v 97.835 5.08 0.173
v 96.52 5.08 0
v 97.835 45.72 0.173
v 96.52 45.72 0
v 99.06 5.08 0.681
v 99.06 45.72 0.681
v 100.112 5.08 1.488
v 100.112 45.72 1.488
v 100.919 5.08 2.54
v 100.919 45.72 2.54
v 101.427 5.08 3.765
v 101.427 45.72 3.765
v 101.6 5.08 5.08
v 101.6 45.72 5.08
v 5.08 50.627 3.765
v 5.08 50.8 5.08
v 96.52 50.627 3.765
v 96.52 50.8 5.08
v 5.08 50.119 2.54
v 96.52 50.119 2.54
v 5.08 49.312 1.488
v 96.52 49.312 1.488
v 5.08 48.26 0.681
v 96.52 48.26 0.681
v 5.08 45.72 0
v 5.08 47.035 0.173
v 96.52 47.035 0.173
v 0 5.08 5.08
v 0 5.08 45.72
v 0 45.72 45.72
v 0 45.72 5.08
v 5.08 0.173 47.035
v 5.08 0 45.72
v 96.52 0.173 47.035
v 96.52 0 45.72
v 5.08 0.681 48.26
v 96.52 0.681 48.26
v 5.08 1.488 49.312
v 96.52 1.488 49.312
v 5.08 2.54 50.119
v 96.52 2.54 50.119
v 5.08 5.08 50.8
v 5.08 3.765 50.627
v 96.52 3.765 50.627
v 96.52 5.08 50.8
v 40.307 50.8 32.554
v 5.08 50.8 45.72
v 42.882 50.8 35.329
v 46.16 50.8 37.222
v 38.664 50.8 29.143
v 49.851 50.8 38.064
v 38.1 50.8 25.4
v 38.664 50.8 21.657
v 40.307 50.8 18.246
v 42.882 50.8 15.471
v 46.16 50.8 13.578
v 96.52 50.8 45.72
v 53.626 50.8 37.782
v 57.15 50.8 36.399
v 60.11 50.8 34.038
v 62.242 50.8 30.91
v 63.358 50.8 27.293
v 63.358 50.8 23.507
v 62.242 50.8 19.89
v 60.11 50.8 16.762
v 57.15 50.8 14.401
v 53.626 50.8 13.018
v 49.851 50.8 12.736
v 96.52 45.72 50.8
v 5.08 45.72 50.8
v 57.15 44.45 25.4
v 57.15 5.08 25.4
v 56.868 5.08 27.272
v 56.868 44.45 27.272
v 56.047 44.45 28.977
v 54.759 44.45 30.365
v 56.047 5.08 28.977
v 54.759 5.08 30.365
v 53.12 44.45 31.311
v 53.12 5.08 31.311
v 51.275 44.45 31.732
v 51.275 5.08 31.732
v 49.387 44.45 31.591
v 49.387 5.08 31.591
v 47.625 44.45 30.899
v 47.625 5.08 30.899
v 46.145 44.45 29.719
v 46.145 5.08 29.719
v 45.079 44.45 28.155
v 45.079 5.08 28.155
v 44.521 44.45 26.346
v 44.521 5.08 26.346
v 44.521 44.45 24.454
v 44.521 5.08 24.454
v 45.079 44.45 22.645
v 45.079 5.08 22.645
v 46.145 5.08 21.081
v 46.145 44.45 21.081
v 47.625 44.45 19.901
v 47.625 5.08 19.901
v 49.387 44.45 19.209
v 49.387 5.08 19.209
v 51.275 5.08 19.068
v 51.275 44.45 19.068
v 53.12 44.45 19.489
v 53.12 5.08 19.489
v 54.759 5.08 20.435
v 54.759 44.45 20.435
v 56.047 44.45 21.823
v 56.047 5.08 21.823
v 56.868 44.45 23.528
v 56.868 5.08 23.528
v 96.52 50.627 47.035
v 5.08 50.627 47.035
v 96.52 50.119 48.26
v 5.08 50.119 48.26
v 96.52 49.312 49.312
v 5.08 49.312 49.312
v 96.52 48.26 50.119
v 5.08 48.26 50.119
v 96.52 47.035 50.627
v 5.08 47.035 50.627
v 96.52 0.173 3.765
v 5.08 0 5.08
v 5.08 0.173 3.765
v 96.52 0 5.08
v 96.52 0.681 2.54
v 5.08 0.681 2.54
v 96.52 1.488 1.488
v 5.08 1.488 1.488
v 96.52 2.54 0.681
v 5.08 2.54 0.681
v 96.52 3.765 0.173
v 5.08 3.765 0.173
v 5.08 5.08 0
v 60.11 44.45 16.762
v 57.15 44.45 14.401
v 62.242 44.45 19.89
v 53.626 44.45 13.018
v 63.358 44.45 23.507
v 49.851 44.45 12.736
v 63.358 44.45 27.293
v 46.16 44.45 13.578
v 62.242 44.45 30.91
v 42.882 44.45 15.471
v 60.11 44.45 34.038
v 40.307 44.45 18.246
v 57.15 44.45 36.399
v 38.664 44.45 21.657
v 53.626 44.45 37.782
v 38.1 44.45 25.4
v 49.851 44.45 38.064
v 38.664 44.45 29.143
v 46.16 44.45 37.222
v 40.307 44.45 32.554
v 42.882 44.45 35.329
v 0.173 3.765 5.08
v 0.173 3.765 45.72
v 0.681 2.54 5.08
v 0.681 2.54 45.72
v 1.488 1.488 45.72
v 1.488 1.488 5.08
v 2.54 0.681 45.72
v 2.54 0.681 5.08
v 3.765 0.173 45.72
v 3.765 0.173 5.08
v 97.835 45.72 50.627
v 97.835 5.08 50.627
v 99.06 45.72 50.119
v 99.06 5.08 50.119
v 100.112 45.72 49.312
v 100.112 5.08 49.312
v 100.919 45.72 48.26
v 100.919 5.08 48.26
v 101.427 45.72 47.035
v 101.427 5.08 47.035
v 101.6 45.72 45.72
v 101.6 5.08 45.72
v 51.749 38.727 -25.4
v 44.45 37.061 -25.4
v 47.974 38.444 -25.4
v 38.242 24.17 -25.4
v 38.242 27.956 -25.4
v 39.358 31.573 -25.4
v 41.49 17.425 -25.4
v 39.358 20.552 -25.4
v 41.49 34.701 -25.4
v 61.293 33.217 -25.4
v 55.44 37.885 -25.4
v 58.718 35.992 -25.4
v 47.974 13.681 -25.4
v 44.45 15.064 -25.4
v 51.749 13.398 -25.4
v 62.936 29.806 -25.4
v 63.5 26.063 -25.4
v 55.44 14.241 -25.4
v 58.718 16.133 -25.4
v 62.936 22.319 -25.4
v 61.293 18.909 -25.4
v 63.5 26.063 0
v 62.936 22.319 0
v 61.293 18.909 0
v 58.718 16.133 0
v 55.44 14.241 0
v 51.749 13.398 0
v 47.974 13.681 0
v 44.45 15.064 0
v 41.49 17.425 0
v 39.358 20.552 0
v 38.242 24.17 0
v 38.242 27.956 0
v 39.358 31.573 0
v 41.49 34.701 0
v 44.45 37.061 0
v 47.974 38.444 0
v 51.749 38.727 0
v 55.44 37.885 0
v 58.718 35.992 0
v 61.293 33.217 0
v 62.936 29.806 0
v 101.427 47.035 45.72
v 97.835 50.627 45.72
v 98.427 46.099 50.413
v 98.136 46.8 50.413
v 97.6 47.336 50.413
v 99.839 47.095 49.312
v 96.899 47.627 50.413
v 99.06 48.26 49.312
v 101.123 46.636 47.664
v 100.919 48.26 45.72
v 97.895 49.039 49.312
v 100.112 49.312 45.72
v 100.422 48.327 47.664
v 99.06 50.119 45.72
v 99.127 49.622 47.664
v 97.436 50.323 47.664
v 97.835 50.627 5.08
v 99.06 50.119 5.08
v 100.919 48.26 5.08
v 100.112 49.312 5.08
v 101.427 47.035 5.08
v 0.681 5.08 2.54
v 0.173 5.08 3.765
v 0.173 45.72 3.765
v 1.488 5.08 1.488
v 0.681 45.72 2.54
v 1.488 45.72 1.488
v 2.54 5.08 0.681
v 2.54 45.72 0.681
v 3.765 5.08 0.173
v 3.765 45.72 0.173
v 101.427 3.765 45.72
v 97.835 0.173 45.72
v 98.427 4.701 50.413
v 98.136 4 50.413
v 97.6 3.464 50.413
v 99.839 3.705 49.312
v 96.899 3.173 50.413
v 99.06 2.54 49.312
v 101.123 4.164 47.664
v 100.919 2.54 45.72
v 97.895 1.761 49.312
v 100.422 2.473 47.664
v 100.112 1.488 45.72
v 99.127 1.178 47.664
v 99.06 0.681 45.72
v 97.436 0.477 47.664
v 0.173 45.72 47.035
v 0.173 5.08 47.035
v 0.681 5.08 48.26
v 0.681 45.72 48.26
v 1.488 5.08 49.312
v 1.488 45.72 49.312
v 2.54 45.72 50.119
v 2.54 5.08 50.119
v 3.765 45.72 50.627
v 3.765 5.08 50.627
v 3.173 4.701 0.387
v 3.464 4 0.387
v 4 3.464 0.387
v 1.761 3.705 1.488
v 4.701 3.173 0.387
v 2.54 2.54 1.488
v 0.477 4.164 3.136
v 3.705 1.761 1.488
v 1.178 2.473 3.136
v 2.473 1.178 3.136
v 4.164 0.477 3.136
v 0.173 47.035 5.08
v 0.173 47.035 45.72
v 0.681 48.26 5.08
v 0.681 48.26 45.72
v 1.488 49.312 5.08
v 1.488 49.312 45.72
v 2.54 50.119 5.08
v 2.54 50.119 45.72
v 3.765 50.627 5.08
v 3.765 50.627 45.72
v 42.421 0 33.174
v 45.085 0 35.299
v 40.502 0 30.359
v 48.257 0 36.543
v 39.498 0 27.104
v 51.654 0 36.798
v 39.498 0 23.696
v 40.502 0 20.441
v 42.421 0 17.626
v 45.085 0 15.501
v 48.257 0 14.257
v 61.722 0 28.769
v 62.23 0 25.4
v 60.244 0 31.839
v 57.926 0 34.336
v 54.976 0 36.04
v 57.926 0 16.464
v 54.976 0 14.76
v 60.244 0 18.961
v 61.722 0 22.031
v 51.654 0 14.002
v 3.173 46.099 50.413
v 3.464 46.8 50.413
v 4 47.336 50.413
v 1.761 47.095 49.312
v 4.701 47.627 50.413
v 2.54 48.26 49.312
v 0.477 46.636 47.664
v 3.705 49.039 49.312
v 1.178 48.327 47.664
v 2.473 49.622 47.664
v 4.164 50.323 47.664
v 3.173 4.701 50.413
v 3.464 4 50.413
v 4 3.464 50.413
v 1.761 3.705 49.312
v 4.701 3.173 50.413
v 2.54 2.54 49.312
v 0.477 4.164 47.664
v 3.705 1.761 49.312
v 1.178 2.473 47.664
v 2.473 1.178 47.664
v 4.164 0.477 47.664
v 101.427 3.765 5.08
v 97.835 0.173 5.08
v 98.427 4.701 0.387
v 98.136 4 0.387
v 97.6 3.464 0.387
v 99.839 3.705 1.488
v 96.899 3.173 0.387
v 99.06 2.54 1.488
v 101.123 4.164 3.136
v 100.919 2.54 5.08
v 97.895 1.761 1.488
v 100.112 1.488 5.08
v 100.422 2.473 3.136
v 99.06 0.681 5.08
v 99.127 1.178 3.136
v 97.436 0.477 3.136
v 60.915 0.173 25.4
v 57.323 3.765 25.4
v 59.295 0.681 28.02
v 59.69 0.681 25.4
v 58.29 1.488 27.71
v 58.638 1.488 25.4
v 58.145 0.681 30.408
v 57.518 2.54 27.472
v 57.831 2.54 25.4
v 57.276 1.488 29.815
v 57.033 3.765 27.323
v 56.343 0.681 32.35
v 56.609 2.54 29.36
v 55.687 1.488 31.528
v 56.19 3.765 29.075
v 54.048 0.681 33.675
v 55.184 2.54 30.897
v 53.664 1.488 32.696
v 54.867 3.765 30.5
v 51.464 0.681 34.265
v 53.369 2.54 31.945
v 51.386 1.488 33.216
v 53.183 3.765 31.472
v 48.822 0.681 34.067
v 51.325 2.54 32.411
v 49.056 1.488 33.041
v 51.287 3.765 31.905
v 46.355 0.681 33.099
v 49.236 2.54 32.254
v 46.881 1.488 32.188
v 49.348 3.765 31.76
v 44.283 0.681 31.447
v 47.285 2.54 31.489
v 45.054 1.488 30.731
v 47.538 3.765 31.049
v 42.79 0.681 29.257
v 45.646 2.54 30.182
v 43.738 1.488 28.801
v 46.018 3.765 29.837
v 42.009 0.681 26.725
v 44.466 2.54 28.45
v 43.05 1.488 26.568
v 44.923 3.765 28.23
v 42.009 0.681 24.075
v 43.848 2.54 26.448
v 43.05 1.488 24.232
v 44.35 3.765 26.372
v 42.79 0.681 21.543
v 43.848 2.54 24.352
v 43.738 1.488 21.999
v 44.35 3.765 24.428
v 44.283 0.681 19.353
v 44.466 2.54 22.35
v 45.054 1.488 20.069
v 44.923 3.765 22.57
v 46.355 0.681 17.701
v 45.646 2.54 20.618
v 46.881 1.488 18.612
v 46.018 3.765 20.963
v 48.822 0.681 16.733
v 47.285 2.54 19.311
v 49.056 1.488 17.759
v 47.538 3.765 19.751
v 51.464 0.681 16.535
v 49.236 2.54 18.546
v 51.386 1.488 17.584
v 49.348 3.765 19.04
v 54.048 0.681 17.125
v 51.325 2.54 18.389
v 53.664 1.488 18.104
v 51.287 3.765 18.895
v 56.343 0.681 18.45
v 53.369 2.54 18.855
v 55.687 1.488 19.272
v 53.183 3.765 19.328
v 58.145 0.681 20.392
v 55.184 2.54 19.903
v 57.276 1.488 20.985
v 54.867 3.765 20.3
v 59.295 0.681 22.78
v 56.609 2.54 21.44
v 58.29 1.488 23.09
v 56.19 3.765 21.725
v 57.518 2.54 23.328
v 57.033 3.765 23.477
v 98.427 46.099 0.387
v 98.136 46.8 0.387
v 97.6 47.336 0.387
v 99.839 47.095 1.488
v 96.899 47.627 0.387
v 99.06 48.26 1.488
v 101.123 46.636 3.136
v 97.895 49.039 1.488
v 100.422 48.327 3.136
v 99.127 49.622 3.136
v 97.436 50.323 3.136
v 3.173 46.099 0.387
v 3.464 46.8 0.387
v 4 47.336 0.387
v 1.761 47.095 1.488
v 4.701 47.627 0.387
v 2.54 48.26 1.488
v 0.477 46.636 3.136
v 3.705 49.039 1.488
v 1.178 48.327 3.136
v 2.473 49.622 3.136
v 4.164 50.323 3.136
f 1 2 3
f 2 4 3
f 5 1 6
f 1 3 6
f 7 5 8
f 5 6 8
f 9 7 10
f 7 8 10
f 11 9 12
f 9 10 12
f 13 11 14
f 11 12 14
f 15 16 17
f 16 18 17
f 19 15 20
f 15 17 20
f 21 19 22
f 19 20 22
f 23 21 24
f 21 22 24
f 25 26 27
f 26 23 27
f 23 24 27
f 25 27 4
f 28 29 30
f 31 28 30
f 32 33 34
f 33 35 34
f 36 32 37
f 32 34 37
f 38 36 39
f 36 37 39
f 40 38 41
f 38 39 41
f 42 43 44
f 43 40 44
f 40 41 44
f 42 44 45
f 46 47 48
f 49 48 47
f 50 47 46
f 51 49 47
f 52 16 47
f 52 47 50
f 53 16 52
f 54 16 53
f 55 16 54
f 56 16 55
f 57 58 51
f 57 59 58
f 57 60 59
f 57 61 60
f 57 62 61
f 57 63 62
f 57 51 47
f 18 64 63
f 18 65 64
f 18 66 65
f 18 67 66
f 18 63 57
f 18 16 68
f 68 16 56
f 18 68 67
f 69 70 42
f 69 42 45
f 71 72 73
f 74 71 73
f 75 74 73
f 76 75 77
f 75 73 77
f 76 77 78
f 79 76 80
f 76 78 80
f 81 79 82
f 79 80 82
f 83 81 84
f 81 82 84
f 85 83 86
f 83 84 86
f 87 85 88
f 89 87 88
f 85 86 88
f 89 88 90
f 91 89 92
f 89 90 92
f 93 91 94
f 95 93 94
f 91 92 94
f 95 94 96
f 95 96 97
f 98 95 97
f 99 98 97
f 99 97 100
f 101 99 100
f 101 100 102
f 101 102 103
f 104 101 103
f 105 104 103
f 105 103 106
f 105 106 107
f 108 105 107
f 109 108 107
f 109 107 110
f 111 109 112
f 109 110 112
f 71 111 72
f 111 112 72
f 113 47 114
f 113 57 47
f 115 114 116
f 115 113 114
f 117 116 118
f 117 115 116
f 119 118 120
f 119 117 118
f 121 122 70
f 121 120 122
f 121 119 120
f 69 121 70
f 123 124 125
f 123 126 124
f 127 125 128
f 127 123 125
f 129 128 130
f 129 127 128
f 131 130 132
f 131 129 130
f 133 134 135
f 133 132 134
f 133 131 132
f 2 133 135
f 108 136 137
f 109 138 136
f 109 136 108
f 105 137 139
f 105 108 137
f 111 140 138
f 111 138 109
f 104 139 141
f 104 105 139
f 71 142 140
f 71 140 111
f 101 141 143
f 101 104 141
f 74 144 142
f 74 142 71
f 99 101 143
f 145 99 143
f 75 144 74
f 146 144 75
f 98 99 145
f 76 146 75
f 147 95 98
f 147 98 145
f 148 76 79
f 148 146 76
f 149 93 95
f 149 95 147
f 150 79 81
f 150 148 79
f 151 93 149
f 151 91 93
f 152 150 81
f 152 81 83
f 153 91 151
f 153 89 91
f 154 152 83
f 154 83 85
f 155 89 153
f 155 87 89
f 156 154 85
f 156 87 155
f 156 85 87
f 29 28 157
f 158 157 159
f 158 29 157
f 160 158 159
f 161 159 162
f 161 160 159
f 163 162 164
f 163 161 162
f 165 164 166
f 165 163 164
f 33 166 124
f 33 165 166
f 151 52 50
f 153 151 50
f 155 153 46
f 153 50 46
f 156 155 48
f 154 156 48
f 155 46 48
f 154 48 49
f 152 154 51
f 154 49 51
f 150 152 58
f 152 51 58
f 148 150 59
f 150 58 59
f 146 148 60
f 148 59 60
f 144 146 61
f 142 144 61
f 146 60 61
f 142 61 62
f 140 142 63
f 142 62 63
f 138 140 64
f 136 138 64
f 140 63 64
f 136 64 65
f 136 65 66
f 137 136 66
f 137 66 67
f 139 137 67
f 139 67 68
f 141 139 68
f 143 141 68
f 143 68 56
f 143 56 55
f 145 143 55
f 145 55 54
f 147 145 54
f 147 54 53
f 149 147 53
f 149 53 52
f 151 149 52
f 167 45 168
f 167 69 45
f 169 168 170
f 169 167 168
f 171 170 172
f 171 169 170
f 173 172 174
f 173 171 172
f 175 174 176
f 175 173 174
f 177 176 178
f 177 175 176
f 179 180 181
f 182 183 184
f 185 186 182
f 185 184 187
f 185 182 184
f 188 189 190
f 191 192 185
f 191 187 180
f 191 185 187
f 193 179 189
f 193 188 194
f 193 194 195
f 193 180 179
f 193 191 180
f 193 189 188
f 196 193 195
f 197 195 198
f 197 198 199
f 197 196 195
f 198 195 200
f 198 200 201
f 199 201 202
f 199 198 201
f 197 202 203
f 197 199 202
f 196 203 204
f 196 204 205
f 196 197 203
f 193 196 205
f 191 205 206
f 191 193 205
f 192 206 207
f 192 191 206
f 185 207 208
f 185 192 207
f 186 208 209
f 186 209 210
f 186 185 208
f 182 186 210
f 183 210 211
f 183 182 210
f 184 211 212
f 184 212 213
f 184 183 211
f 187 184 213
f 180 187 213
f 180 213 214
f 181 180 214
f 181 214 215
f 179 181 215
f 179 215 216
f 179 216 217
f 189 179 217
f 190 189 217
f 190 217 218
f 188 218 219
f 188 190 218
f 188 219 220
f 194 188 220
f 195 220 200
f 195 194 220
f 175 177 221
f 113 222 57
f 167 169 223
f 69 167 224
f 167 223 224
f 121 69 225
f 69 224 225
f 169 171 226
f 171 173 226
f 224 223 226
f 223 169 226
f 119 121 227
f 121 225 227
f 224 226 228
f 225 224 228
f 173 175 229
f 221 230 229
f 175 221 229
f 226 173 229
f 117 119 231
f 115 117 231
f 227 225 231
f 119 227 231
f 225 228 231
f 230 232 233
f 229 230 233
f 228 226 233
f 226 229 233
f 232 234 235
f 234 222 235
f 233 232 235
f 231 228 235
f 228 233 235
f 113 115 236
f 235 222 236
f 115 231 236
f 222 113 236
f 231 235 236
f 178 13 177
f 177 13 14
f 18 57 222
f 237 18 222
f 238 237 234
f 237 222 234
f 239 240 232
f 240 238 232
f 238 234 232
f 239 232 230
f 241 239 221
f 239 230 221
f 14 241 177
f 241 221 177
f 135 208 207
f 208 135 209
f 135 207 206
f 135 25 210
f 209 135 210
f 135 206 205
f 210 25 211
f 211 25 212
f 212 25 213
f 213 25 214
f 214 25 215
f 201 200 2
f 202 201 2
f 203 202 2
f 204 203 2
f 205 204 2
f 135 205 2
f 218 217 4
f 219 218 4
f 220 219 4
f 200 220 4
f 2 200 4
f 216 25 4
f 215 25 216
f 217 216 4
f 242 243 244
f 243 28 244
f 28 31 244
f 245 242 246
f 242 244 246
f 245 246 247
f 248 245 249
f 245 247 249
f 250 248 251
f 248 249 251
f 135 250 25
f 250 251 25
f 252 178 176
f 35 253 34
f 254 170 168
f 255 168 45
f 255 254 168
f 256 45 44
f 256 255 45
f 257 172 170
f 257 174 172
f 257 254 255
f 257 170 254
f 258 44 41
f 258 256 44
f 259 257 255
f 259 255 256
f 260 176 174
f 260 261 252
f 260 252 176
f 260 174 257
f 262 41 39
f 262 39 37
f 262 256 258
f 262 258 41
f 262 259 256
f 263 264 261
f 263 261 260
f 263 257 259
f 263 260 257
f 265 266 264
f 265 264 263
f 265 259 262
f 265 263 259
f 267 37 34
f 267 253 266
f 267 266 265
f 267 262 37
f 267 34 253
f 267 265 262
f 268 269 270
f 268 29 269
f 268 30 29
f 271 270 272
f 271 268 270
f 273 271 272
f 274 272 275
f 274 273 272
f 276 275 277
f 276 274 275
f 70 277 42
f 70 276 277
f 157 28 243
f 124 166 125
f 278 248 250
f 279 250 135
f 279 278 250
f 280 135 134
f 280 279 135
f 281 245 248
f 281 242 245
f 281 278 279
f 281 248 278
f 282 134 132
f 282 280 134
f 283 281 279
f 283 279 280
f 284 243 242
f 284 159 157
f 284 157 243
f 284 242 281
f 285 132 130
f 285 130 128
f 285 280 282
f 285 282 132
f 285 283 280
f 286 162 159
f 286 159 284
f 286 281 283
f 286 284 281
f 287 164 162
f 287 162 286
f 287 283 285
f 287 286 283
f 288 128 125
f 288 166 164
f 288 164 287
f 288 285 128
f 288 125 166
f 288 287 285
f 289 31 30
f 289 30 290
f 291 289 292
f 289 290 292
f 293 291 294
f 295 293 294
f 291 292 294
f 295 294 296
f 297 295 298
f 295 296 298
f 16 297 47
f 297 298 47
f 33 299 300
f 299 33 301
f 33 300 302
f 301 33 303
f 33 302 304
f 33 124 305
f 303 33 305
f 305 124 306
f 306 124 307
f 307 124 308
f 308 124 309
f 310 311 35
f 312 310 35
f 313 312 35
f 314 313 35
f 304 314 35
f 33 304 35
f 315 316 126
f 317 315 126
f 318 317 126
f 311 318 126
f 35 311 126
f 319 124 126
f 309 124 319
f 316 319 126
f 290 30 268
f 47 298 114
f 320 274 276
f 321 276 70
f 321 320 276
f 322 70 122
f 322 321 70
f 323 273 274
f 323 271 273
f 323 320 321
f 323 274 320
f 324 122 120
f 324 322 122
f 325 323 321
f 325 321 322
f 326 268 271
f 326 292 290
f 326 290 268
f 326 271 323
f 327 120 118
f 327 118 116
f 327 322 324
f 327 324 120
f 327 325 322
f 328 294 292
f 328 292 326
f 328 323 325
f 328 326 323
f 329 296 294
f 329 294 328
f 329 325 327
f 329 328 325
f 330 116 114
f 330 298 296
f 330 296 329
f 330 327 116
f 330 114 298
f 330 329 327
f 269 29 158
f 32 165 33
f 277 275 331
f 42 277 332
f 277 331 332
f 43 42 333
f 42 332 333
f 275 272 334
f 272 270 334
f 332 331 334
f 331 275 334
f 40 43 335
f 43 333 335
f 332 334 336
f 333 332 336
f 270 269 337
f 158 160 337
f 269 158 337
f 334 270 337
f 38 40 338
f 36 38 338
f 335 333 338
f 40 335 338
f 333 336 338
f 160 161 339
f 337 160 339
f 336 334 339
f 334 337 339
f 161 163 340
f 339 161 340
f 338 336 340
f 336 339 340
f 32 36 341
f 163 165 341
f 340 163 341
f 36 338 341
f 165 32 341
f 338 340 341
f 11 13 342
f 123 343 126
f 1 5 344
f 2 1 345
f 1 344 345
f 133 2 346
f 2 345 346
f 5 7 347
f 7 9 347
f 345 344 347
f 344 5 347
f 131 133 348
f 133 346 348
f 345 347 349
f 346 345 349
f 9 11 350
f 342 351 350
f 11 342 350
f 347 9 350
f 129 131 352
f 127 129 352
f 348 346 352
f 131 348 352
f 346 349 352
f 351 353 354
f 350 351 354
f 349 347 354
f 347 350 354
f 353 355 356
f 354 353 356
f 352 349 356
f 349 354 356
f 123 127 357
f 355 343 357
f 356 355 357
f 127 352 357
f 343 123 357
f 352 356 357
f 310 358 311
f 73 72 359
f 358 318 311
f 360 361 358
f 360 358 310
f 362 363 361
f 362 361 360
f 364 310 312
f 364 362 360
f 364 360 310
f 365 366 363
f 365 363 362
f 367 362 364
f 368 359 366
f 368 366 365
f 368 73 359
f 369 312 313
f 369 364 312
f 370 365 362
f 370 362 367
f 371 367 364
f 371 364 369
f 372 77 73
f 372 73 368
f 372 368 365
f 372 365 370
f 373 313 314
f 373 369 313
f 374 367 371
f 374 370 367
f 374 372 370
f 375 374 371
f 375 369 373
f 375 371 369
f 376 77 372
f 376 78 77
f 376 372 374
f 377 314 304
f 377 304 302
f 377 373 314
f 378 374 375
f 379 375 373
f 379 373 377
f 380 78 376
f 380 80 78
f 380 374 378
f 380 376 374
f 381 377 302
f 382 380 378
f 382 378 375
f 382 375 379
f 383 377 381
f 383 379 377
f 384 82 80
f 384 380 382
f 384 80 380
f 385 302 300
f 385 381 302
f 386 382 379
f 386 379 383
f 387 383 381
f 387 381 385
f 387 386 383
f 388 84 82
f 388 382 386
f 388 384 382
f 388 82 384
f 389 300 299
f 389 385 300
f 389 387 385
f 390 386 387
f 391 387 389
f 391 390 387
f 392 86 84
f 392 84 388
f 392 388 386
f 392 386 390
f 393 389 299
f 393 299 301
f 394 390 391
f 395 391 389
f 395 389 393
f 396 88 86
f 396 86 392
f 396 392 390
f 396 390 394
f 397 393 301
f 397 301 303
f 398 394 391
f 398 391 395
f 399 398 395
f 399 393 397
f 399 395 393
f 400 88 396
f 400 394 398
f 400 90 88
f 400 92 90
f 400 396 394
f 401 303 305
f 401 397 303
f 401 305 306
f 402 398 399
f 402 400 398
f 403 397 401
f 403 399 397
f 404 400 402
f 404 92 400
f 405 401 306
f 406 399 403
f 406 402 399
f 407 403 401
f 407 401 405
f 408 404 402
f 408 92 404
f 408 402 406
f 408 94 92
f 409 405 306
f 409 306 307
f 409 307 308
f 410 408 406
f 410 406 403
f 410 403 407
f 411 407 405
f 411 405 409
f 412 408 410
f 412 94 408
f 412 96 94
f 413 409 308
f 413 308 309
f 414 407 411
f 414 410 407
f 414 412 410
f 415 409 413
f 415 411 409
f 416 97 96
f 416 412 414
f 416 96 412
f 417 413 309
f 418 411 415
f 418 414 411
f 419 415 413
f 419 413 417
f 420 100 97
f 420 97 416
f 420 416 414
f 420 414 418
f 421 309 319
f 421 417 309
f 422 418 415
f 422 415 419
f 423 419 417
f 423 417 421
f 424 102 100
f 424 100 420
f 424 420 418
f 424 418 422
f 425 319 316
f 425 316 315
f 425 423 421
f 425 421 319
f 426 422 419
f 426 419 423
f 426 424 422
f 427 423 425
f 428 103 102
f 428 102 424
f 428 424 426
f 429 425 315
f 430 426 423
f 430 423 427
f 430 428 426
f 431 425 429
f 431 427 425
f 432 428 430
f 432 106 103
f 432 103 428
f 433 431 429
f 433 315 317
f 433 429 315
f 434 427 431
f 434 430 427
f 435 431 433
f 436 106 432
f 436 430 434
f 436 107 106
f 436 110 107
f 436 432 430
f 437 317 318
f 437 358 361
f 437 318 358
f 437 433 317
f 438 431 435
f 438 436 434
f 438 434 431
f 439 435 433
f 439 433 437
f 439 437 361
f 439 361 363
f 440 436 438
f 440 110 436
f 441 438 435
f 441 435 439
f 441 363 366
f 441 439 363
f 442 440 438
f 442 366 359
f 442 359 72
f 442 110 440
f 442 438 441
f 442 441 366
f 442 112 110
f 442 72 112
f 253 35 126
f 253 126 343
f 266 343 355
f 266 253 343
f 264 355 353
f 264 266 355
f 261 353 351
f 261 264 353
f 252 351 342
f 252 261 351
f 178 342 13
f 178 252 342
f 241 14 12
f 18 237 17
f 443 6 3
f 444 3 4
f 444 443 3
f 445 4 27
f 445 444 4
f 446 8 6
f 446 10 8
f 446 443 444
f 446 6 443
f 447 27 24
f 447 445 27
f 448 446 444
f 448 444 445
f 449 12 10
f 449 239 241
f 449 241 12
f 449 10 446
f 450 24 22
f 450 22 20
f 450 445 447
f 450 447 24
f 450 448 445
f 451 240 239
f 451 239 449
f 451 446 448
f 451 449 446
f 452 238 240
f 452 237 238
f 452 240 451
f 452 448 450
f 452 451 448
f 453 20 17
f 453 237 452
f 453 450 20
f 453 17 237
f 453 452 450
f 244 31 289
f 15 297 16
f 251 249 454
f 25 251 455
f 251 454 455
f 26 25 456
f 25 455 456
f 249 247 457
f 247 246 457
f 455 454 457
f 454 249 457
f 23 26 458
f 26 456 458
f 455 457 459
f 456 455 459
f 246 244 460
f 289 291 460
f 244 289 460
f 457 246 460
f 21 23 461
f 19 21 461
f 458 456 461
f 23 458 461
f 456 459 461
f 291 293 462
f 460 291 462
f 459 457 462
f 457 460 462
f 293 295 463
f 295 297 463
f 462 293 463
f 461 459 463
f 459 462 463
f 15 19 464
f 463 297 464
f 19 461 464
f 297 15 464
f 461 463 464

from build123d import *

# Parameters (mm, degrees)
F0_W           = 101.6
F0_H           = 50.8
F1_DEPTH       = 50.8
F3_D           = 12.7
F3_CBORE_D     = 25.4
F3_CBORE_DEPTH = 6.35
F5_R           = 12.7
F6_DEPTH       = 25.4
F7_R           = 5.08


with BuildPart() as f1:
    # F0 (on Top) → F1 (new body)
    with BuildSketch(Plane.XY):
        with Locations((50.8, 25.4)):
            Rectangle(F0_W, F0_H)
    extrude(amount=F1_DEPTH)

    # F3 (through all)
    with Locations(Plane(origin=(0, 50.8, 0), x_dir=(-1, 0, 0), z_dir=(0, 1, 0))):
        with Locations((-50.8, 25.4)):
            CounterBoreHole(F3_D / 2, F3_CBORE_D / 2, F3_CBORE_DEPTH)

    # F5 (on offset) → F6 (join, through all)
    with BuildSketch(Plane(origin=(0, 0, -25.4), x_dir=(1, 0, 0), z_dir=(0, 0, -1))):
        with Locations((50.8, -26.0627344251)):
            Circle(F5_R)
    extrude(amount=-F6_DEPTH)

    # F7
    f7_edges = [f1.edges().sort_by_distance(p)[0] for p in [
        (101.6, 0, 25.4),
        (101.6, 50.8, 25.4),
        (101.6, 25.4, 0),
        (101.6, 25.4, 50.8),
        (0, 50.8, 25.4),
        (0, 0, 25.4),
        (0, 25.4, 0),
        (0, 25.4, 50.8),
        (50.8, 0, 50.8),
        (50.8, 50.8, 50.8),
        (50.8, 0, 0),
        (57.15, 0, 25.4),
        (50.8, 50.8, 0),
    ]]
    fillet(f7_edges, radius=F7_R)


solid = f1.part
